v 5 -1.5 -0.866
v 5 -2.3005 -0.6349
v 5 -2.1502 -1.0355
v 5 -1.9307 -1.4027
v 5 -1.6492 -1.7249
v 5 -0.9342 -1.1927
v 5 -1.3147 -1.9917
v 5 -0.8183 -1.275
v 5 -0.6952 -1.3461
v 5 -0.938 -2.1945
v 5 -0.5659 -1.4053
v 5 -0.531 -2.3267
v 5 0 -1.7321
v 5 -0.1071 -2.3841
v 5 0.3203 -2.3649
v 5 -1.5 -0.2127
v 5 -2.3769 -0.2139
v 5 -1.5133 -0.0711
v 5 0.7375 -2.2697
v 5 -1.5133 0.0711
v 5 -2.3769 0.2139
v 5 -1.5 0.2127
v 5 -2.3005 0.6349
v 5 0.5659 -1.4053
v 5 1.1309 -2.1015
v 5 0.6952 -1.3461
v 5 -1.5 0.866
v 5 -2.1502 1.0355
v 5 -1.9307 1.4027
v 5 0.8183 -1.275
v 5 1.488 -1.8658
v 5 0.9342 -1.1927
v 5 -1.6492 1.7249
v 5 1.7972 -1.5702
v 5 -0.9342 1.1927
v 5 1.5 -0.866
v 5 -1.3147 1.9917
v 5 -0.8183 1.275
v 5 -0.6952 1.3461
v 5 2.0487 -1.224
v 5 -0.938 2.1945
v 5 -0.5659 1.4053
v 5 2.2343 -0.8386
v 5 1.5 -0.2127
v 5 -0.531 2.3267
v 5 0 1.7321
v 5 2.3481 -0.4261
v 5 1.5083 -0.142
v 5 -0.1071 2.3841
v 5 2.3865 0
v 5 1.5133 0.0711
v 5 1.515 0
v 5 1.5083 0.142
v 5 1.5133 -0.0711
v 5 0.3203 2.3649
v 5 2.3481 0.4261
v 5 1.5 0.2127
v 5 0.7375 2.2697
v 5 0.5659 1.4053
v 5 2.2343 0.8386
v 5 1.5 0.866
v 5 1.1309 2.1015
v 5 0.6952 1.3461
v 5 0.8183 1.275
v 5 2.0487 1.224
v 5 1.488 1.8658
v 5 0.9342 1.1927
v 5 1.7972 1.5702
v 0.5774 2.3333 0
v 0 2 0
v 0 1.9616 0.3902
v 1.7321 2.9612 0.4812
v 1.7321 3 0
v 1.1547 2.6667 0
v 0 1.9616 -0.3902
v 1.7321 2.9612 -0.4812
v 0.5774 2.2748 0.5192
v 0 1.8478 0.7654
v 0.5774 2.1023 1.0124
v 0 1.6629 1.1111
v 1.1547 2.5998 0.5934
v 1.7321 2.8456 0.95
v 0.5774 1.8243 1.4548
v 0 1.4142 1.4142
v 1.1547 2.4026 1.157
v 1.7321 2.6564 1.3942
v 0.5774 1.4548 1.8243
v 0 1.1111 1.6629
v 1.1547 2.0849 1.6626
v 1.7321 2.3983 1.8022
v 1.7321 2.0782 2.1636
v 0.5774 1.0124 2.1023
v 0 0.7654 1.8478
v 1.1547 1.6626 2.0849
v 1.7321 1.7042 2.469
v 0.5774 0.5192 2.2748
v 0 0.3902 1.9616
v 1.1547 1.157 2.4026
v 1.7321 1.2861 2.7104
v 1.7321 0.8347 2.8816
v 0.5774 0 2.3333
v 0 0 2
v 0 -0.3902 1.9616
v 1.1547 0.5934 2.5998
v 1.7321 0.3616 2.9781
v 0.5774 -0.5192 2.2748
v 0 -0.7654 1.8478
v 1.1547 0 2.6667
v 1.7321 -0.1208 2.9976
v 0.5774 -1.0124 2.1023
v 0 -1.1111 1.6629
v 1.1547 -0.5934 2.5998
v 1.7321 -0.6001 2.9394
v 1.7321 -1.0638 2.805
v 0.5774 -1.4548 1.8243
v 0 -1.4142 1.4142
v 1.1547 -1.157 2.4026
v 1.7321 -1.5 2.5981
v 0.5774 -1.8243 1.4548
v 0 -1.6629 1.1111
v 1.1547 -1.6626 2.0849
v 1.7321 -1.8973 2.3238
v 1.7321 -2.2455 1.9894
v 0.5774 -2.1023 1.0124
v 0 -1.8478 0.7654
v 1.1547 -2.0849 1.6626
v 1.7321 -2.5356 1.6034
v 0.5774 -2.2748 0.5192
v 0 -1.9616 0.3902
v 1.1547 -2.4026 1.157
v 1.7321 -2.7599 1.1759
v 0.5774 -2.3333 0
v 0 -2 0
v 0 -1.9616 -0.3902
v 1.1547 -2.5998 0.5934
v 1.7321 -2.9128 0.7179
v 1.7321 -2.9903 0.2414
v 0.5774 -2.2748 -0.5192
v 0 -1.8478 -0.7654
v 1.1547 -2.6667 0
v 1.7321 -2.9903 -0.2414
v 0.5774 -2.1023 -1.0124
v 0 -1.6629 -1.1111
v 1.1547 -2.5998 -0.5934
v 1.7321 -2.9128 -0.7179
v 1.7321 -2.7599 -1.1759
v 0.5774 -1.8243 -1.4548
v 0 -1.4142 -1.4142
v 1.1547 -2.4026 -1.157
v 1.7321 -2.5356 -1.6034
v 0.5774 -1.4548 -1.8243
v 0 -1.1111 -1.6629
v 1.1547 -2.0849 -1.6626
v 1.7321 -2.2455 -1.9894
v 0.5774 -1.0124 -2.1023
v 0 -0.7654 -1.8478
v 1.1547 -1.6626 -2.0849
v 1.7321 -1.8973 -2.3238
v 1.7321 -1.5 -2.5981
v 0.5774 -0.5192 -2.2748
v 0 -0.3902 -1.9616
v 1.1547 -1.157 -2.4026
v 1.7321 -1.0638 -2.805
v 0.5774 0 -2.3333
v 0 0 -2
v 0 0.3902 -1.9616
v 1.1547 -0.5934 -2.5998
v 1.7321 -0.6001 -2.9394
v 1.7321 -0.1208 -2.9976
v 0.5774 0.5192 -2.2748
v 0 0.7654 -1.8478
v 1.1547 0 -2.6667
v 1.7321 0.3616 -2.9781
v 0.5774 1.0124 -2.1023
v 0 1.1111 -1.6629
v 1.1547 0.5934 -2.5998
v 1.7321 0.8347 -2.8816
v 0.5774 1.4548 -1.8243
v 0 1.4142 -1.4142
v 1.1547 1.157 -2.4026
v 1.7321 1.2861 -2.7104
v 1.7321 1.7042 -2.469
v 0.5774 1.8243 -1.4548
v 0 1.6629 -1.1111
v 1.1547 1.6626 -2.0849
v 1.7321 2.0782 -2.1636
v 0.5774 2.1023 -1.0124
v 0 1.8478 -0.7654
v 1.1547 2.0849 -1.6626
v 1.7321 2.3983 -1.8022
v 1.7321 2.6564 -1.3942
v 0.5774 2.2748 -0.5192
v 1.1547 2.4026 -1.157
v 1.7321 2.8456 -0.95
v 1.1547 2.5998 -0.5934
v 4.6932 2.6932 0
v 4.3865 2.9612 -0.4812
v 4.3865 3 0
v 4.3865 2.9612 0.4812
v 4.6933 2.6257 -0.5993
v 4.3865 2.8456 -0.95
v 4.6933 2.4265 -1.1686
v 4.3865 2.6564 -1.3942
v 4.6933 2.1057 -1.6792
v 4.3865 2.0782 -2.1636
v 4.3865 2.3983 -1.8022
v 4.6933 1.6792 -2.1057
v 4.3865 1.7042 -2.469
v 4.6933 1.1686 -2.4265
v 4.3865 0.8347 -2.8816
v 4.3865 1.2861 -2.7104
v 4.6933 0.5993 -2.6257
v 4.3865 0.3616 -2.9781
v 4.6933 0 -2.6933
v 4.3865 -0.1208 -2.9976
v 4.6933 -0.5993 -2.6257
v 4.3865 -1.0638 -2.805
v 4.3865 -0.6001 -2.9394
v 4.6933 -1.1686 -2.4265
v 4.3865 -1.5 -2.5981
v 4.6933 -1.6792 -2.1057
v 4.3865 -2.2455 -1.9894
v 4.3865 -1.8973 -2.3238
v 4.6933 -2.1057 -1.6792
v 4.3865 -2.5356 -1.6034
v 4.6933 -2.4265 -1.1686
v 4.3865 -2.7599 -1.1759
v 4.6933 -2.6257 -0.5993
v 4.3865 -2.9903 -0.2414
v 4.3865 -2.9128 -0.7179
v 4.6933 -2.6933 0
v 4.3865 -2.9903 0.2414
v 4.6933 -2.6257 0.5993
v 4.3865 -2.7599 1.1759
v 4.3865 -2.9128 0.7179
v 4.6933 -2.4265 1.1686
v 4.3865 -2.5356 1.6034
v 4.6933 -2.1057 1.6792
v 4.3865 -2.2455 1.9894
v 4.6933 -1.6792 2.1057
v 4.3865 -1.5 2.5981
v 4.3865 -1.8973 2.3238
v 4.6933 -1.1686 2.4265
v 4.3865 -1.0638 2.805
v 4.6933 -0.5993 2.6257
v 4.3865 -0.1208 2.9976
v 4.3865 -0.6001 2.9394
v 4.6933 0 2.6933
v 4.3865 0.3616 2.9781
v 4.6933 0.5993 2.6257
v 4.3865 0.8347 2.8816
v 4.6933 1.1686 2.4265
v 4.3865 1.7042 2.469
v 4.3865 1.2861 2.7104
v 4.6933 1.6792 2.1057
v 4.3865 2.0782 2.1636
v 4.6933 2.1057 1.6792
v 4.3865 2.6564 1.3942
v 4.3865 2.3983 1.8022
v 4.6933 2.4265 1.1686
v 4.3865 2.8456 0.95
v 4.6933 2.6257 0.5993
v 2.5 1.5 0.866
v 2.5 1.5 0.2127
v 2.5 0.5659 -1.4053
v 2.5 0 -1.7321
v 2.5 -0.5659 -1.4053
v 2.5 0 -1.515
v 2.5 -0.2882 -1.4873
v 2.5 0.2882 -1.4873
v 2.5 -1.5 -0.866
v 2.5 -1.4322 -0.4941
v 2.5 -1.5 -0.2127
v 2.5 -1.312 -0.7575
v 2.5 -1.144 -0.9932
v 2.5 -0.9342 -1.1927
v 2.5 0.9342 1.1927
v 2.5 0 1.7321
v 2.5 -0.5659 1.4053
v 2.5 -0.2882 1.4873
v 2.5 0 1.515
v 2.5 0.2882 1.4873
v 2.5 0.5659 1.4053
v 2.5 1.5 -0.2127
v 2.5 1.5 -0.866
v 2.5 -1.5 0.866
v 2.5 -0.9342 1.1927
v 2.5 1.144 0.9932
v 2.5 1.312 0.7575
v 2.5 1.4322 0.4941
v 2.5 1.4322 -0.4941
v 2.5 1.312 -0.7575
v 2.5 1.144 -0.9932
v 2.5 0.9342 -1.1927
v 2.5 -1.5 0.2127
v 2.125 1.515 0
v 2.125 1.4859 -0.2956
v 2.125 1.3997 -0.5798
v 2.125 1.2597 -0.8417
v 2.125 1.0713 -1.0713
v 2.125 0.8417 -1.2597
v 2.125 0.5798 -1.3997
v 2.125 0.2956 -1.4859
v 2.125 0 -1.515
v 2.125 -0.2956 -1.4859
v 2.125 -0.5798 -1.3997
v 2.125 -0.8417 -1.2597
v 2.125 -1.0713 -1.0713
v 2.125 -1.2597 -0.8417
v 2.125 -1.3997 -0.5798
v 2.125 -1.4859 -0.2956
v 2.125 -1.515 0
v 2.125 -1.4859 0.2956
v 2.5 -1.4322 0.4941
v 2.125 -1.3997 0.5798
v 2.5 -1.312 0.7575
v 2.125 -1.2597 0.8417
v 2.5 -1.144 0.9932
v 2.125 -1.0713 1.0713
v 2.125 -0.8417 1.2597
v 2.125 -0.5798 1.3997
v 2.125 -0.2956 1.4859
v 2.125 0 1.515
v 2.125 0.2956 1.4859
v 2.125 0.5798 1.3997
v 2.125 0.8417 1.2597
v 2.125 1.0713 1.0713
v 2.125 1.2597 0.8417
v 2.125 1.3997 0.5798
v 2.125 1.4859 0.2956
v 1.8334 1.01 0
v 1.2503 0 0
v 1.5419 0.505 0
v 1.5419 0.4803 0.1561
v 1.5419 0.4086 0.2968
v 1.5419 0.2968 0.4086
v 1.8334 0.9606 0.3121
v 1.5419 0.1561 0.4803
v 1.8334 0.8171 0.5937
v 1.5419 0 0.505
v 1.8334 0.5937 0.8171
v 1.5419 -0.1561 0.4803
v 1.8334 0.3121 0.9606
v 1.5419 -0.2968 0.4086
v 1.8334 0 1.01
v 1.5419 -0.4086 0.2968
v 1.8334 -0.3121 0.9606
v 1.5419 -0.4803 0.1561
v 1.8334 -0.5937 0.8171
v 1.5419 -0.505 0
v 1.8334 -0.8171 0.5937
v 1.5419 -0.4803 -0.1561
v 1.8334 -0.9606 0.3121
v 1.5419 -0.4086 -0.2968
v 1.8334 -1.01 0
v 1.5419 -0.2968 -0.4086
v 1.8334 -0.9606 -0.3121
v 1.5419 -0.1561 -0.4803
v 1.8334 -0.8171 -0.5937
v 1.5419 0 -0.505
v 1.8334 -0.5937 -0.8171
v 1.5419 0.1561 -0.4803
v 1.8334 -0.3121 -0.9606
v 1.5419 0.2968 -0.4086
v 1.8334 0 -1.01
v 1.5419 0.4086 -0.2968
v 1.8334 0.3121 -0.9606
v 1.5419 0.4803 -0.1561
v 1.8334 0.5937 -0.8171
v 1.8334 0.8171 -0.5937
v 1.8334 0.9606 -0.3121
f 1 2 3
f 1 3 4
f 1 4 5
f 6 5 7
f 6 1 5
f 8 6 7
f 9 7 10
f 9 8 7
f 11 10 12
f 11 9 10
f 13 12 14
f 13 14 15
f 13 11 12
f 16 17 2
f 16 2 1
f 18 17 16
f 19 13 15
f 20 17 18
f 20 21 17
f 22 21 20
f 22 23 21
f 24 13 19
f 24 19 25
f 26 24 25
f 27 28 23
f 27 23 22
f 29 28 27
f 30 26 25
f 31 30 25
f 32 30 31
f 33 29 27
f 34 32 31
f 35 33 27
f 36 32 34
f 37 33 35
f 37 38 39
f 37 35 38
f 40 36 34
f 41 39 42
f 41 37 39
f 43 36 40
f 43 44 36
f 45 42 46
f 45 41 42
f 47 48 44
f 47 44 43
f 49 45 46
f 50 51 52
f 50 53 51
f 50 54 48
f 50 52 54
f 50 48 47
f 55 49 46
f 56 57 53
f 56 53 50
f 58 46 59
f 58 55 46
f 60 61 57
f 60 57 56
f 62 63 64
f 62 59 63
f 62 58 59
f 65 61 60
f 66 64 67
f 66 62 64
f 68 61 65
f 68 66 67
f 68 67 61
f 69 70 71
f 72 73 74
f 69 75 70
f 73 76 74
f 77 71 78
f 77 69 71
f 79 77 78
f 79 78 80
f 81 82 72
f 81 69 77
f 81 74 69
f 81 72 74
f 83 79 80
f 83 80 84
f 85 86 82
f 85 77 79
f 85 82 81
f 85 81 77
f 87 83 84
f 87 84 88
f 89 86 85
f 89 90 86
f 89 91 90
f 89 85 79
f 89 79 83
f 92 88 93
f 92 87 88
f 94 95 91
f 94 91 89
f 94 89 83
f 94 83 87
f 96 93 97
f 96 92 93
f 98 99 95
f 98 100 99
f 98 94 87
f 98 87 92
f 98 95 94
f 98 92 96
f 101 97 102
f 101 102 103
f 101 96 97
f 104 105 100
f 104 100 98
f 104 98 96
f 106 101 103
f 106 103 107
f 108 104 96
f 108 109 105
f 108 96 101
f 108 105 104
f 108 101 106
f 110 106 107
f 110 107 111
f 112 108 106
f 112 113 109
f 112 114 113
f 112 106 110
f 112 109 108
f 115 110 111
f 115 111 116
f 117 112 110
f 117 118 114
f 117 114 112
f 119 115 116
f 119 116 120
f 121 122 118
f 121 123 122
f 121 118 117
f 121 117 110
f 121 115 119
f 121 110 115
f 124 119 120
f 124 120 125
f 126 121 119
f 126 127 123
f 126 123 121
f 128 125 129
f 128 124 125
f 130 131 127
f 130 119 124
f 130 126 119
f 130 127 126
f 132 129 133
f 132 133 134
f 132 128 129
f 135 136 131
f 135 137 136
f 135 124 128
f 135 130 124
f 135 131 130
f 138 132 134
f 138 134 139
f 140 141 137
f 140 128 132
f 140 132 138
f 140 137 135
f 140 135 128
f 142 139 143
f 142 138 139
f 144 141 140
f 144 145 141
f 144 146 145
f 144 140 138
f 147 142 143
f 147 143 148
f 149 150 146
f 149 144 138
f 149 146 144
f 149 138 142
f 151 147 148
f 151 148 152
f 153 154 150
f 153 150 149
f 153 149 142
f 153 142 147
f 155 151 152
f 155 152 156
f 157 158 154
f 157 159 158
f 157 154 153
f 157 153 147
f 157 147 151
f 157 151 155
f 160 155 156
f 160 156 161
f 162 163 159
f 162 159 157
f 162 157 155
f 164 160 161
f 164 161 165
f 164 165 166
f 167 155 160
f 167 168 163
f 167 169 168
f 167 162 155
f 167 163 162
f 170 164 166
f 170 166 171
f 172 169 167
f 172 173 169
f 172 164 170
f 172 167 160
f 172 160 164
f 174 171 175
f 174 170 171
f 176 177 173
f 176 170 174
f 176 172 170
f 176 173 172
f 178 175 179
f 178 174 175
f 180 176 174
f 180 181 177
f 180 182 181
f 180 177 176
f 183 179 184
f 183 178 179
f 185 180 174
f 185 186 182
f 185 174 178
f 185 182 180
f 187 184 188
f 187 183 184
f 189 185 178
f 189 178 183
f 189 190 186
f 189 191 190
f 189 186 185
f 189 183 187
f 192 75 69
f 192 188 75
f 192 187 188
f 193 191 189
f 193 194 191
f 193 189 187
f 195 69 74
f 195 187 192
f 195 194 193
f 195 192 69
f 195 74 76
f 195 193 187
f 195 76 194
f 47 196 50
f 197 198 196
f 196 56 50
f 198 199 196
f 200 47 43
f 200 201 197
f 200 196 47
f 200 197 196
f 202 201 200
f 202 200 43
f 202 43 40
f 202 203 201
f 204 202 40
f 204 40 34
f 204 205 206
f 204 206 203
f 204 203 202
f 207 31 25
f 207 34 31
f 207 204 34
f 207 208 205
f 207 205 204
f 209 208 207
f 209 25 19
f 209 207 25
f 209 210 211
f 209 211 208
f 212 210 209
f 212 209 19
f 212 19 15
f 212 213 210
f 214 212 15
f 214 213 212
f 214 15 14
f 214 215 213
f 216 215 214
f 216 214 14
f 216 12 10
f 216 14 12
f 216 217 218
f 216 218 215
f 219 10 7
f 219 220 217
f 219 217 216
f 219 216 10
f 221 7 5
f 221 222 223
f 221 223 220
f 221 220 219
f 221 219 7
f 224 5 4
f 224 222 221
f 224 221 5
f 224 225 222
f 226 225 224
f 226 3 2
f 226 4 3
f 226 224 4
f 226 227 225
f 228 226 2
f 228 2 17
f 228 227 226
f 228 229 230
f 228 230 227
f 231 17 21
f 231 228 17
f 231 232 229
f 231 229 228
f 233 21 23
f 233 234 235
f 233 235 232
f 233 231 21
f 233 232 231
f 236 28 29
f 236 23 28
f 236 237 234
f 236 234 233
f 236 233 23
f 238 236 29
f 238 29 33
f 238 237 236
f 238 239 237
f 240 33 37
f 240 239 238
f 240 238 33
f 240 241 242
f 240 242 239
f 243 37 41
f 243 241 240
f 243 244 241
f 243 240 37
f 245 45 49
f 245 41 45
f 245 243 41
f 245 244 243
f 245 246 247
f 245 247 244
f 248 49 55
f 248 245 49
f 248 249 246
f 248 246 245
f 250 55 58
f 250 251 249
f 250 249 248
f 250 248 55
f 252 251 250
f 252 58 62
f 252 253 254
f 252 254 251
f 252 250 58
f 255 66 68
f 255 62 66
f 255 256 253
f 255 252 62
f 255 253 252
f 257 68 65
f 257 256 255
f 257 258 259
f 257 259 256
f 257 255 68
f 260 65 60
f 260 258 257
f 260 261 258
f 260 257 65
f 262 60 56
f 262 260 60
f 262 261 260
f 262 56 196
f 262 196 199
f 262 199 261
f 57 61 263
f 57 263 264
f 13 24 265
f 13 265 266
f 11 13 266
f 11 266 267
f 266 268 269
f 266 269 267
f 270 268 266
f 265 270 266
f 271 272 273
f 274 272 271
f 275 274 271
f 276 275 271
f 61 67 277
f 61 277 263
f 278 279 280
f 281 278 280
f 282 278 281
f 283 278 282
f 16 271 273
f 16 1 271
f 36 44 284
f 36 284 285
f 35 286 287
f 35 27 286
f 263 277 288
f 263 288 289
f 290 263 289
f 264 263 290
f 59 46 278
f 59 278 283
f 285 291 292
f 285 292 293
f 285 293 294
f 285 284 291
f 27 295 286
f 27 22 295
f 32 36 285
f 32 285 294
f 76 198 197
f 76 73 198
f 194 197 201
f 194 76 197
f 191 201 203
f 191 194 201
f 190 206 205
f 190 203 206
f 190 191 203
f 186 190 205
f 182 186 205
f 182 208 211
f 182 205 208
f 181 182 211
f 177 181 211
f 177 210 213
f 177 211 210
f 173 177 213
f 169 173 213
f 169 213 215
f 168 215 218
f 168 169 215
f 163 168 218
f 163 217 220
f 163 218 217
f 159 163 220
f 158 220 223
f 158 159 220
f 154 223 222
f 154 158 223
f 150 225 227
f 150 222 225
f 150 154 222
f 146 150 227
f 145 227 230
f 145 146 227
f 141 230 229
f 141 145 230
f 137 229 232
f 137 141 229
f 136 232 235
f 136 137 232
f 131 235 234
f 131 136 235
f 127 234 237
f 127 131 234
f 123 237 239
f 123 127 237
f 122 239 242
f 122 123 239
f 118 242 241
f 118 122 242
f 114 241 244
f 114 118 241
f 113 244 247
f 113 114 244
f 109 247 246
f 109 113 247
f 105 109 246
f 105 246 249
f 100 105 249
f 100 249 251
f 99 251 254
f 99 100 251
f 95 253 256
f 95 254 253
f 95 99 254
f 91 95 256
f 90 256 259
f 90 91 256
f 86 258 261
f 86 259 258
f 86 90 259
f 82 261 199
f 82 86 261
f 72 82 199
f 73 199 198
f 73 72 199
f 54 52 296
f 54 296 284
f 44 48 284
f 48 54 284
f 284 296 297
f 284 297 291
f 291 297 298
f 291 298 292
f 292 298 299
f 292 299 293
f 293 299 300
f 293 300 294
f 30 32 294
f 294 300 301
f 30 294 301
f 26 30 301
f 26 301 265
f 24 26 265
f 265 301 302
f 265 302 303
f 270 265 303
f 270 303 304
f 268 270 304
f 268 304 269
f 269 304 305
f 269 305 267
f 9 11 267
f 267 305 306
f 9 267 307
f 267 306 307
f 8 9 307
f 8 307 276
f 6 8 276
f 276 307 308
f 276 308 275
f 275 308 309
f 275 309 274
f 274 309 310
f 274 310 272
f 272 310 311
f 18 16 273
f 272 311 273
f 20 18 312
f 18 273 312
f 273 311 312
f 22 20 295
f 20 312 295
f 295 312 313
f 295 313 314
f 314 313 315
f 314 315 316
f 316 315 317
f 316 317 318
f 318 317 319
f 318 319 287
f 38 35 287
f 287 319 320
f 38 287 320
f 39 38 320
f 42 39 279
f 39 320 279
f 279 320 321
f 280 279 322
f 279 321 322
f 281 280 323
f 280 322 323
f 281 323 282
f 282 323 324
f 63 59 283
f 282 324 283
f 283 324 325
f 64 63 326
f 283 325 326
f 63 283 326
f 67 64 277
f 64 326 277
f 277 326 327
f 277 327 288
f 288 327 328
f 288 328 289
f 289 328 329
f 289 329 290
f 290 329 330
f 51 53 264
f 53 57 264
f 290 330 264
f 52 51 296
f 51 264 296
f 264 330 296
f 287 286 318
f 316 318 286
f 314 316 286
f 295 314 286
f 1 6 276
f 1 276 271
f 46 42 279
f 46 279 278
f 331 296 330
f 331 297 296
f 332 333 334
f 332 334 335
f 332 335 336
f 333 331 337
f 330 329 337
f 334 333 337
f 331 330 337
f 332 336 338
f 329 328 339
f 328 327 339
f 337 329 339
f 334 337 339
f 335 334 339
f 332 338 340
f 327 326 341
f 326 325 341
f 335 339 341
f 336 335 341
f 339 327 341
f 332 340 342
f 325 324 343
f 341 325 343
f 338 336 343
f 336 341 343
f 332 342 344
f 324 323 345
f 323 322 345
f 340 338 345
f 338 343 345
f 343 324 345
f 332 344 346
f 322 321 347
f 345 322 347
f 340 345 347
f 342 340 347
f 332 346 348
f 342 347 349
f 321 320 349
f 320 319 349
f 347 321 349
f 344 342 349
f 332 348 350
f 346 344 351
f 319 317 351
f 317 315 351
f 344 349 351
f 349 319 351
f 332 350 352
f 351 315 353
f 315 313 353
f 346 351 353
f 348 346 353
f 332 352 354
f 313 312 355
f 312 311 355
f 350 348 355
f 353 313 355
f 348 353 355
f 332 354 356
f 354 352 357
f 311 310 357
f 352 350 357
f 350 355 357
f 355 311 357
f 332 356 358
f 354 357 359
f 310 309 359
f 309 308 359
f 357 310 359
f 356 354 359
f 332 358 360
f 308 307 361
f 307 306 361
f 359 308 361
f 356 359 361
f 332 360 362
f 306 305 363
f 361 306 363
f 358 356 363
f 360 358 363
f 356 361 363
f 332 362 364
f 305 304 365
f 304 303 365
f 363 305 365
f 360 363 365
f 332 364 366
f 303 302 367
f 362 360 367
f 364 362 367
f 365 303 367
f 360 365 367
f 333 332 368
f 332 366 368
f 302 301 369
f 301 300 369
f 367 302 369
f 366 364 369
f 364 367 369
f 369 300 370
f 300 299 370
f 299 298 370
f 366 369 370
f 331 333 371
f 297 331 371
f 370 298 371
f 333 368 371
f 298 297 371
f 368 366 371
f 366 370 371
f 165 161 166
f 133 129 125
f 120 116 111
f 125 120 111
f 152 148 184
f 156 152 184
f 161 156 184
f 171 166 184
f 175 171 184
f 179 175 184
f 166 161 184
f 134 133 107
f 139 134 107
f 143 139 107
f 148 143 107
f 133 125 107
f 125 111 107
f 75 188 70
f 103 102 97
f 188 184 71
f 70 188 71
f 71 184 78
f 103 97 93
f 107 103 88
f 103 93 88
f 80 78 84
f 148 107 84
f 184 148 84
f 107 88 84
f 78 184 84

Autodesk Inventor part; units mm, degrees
ref_plane "YZ Plane" through (0, 0, 0) normal (1, 0, 0) x (0, 1, 0)
ref_plane "XZ Plane" through (0, 0, 0) normal (0, 1, 0) x (-1, 0, 0)
sketch "Esquisse1" plane through (0, 0, 0) normal (0, 0, 1) x (1, 0, 0)
  line L0 (0, 0) -> (1.2503, 0)
  line L1 (5, 1.515) -> (5, 3)
  line L2 (5, 3) -> (0, 3)
  line L3 (5, 1.515) -> (2.125, 1.515)
  line L4 (2.125, 1.515) -> (1.2503, 0)
  line L5 (-1, 0) -> (6, 0) projected
  line L6 (0, 3) -> (0, 0)
  line L7 (0, -0.6) -> (0, 3.6) projected
  dimension "d0" = 2.875
  dimension "d1" = 60
  dimension "d2" = 6
  dimension "d3" = 3.03
  dimension "d12" = 5
revolve "Corps" add sketch "Esquisse1" angle 360 about axis through (0, 0, 0) along (1, 0, 0)
sketch "Esquisse2" plane through (5, 0, 0) normal (1, 0, 0) x (0, 0, -1)
  line L0 (-0.866, 1.5) -> (0.866, 1.5)
  line L1 (0.866, 1.5) -> (1.7321, 0)
  line L2 (1.7321, 0) -> (0.866, -1.5)
  line L3 (0.866, -1.5) -> (-0.866, -1.5)
  line L4 (-0.866, -1.5) -> (-1.7321, 0)
  line L5 (-1.7321, 0) -> (-0.866, 1.5)
  point P0 (0, 0)
  point P1 (0, 0)
  dimension "d13" = 3
extrude "Rainure" cut sketch "Esquisse2" against normal blind 2.5
thread "Filetage" size "M6x1" class "6g" standard "ANSI Metric M Profile" full length
chamfer "Chanfrein1" distance 0.6135 angle 45 1 edges at (5, -3, 0) measured on face at (5, 1.628, -1.8837)
chamfer "Chanfrein2" distance 1 angle 60 1 edges at (0, -3, 0) measured on face at (0, -1.1424, 0.935)
ref_plane "Work Plane3" through (2.5, 0, 0) normal (0, -0.5, -0.866) x (1, 0, 0)
equation "\"d0\" = 1.15 * INTI"
equation "\"d2\" = NND"
equation "\"d3\" = 1.01 * SW"
equation "\"d12\" = NLG"
equation "\"d13\" = SW"
equation "\"d4\" = INTI"
equation "\"d8\" = -0.5 * GD1 + 0.5 * NND"
equation "\"d39\" = -0.5 * GD1 + 0.5 * NND"
equation "\"d15\" = -0.5 * SPD + 0.5 * NND"
equation "\"d40\" = -0.5 * SPD + 0.5 * NND"
equation "\"NND\" = 6"
equation "\"NLG\" = 5"
equation "\"INTI\" = 2.5"
equation "\"FAWI\" = 45deg"
equation "\"SW\" = 3"
equation "\"GD1\" = THREADDIA - 1.2269 * PTC"
equation "\"FAWI1\" = 30deg"
equation "\"SPD\" = 4"
equation "\"GUL\" = 0.61345 * PTC"
equation "\"TOA\" = 30deg"
equation "\"THREADDIA\" = 6"
equation "\"PTC\" = 1"
equation "\"GAL\" = 0.61345 * PTC"
equation "\"E0\" = 1.155 * SW"
properties part number "ANSI B18.3.6M - M6x1 x 5" material "Acier, doux"
